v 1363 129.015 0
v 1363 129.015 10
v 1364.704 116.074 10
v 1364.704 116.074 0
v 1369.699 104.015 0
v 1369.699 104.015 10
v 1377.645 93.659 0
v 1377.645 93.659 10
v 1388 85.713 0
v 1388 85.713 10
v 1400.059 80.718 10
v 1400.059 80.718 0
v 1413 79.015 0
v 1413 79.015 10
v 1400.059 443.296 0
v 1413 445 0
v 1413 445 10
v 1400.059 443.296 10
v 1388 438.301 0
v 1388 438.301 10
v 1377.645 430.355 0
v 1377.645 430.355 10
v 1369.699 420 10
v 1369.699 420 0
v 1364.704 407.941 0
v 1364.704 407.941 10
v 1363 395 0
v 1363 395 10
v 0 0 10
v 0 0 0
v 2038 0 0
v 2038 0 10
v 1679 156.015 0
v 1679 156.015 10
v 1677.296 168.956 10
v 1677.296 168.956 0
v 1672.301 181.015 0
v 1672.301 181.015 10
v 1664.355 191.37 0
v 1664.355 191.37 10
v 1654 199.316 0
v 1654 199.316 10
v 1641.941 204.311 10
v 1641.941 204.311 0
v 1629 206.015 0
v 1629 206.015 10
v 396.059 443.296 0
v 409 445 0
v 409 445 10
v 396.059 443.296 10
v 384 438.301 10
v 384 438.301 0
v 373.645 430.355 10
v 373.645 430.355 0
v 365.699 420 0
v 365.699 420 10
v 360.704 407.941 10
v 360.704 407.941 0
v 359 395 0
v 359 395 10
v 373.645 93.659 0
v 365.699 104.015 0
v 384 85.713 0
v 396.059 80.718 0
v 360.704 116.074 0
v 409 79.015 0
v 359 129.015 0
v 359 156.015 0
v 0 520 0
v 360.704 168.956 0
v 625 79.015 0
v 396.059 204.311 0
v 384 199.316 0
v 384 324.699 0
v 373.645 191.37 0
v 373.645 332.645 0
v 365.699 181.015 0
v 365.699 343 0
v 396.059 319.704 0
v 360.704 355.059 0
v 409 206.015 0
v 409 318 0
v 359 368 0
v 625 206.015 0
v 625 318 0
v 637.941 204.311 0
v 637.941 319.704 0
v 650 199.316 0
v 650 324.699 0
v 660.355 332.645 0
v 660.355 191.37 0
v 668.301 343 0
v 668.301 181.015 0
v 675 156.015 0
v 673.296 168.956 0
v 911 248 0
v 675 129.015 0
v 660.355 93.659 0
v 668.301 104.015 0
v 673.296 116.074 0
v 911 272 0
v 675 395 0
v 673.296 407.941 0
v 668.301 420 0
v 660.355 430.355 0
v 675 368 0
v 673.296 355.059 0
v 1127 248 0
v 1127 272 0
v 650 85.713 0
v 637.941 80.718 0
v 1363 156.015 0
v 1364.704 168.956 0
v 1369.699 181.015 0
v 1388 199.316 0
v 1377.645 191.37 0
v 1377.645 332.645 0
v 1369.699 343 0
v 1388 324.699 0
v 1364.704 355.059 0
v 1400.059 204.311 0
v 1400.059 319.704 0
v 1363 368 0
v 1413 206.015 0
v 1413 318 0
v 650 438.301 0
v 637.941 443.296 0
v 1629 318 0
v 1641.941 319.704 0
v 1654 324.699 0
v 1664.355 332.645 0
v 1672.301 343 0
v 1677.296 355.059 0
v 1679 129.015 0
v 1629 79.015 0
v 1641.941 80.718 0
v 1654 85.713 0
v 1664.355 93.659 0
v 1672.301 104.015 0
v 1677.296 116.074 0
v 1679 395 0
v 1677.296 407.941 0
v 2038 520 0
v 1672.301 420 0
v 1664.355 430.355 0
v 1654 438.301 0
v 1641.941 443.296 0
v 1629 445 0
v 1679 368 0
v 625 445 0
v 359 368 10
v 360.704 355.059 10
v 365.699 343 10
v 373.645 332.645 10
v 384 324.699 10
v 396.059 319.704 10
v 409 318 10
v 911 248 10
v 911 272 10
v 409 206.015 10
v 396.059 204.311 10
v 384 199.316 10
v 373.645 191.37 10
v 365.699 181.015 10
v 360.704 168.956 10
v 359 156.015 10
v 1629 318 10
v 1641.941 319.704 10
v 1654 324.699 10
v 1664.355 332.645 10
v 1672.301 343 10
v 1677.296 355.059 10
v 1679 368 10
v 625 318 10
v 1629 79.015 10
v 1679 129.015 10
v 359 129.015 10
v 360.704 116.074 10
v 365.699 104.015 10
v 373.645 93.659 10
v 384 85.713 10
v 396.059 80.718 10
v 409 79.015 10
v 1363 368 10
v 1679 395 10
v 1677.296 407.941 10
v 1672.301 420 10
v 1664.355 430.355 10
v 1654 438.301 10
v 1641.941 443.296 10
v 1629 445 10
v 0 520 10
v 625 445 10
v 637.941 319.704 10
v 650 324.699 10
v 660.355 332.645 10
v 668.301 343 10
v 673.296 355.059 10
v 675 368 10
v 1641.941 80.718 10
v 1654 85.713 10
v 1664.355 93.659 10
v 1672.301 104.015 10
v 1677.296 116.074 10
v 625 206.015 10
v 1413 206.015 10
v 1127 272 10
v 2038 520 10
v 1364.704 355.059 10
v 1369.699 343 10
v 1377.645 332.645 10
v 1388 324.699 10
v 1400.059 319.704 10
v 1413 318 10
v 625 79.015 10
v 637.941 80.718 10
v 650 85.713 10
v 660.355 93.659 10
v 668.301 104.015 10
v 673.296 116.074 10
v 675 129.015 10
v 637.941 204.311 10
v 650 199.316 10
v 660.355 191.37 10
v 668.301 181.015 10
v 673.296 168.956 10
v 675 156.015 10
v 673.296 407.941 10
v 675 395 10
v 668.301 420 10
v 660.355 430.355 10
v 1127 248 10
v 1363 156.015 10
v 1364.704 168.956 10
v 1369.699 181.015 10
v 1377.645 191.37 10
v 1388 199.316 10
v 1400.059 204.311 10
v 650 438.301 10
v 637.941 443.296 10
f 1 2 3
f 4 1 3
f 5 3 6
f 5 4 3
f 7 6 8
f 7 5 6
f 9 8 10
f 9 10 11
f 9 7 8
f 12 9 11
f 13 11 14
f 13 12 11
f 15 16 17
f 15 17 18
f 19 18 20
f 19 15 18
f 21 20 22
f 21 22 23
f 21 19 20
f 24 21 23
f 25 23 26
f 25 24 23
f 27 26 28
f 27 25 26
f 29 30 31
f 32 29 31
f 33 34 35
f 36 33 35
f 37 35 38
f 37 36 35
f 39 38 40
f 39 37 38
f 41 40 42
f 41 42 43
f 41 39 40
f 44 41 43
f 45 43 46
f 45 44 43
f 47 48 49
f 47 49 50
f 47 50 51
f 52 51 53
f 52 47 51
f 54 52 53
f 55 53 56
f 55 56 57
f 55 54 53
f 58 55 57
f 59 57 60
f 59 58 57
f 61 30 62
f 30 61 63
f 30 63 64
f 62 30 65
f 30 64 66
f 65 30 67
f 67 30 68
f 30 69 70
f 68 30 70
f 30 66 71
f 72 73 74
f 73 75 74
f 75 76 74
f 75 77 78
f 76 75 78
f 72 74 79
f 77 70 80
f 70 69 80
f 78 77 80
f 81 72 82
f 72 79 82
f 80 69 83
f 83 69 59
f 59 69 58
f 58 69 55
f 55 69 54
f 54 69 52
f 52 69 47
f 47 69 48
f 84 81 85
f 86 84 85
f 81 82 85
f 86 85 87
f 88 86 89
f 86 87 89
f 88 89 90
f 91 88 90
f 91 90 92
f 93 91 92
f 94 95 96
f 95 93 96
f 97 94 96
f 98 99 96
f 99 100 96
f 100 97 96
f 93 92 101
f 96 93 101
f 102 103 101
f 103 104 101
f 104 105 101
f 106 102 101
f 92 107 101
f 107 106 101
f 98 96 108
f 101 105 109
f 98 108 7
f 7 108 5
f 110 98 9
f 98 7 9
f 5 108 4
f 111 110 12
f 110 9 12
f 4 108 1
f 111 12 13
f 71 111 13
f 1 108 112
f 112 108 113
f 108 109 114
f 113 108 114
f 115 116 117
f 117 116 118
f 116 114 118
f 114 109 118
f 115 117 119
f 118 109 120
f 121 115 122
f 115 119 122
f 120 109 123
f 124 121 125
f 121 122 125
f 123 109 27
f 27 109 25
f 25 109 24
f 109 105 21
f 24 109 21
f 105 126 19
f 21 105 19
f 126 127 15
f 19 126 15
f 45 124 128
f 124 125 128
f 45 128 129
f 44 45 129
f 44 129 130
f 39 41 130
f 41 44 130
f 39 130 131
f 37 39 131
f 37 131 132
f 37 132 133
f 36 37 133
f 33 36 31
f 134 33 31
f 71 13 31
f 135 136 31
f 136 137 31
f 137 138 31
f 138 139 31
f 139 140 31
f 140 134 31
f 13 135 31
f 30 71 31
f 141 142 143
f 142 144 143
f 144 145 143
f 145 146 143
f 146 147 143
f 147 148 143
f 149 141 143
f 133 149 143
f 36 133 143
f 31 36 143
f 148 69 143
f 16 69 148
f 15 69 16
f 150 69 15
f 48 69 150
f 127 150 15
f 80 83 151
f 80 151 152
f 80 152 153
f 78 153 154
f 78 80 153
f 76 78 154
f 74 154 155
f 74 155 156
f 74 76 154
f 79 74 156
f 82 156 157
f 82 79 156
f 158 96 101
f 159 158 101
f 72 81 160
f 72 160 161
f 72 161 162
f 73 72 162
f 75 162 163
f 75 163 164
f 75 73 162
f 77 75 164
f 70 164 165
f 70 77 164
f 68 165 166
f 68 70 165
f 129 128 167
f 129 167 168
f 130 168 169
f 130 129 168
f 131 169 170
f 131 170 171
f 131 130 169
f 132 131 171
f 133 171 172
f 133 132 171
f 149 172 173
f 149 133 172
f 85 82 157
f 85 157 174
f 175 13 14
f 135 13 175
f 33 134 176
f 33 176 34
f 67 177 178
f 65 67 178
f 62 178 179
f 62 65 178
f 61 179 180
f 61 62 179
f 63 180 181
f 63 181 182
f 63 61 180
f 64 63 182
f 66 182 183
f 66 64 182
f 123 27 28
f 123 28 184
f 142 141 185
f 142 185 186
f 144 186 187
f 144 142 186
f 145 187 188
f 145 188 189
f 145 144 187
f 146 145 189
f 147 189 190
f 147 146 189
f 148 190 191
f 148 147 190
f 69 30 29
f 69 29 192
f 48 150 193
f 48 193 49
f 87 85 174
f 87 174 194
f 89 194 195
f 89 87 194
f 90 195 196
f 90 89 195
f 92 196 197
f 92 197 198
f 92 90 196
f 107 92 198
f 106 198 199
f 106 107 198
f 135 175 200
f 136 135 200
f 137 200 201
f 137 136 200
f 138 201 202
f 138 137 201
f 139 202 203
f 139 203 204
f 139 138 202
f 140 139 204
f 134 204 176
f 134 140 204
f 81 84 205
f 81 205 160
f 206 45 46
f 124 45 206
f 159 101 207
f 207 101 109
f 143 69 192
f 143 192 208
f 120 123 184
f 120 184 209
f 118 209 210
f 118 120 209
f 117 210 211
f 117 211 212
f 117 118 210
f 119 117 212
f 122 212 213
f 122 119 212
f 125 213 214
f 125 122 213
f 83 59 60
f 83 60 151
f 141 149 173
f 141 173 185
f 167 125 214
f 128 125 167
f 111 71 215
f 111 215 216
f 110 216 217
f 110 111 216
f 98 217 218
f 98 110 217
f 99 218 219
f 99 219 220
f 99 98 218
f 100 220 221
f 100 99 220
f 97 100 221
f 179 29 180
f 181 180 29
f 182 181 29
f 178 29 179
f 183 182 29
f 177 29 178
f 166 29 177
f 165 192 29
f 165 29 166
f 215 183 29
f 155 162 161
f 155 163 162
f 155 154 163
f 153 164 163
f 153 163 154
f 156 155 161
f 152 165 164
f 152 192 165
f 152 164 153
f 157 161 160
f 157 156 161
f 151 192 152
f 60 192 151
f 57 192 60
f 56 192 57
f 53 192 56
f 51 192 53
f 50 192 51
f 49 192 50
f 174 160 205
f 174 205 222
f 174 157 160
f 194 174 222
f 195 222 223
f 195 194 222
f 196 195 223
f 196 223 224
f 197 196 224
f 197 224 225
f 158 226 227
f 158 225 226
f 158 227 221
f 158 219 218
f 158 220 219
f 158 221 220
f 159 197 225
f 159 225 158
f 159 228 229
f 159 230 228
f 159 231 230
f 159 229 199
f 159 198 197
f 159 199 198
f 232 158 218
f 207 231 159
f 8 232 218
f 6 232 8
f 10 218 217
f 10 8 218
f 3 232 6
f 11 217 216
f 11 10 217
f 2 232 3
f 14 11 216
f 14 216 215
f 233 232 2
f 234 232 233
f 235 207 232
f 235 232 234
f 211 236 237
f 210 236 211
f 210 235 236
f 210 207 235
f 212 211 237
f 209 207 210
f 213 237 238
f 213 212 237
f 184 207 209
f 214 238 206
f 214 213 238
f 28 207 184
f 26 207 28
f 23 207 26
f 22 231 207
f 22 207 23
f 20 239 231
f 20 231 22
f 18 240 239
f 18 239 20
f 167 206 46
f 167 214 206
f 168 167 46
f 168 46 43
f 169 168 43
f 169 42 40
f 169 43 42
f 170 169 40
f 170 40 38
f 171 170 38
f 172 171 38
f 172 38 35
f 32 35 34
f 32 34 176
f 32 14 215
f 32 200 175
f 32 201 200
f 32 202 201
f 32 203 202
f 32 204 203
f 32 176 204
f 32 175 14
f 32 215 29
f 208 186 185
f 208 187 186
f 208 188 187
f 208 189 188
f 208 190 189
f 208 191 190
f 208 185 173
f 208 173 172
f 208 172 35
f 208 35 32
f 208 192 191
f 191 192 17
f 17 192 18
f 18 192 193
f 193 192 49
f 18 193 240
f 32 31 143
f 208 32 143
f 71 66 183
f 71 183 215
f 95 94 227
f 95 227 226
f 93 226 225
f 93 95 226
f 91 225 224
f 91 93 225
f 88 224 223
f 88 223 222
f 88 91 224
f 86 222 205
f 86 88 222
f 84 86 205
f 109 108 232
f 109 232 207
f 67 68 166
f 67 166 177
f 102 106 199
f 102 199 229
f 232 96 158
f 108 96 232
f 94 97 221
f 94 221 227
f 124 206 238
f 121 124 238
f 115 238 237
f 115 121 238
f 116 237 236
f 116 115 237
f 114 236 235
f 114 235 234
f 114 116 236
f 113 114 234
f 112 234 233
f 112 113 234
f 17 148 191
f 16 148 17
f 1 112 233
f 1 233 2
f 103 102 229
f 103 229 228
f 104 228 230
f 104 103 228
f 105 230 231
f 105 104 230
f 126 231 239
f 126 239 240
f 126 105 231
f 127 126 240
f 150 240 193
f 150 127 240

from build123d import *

# Parameters (mm, degrees)
SKETCH_W   = 2038
SKETCH_H   = 520
SKETCH_W_2 = 216
SKETCH_H_2 = 24
PAD_DEPTH  = 10


with BuildPart() as part:
    # Sketch → Pad (new body)
    with BuildSketch(Plane.XY):
        with Locations((1019, 260)):
            Rectangle(SKETCH_W, SKETCH_H)
        with BuildLine():
            Line((359, 395), (359, 368))
            ThreePointArc((359, 368), (373.644661, 332.644661), (409, 318))
            Line((409, 318), (625, 318))
            ThreePointArc((625, 318), (660.355339, 332.644661), (675, 368))
            Line((675, 368), (675, 395))
            ThreePointArc((675, 395), (660.355339, 430.355339), (625, 445))
            Line((625, 445), (409, 445))
            ThreePointArc((409, 445), (373.644661, 430.355339), (359, 395))
        make_face(mode=Mode.SUBTRACT)
        with BuildLine():
            Line((1363, 395), (1363, 368))
            ThreePointArc((1363, 368), (1377.644661, 332.644661), (1413, 318))
            Line((1413, 318), (1629, 318))
            ThreePointArc((1629, 318), (1664.355339, 332.644661), (1679, 368))
            Line((1679, 368), (1679, 395))
            ThreePointArc((1679, 395), (1664.355339, 430.355339), (1629, 445))
            Line((1629, 445), (1413, 445))
            ThreePointArc((1413, 445), (1377.644661, 430.355339), (1363, 395))
        make_face(mode=Mode.SUBTRACT)
        with BuildLine():
            Line((359, 156.0146), (359, 129.0146))
            ThreePointArc((359, 129.0146), (373.644661, 93.659261), (409, 79.0146))
            Line((409, 79.0146), (625, 79.0146))
            ThreePointArc((625, 79.0146), (660.355339, 93.659261), (675, 129.0146))
            Line((675, 129.0146), (675, 156.0146))
            ThreePointArc((675, 156.0146), (660.355339, 191.369939), (625, 206.0146))
            Line((625, 206.0146), (409, 206.0146))
            ThreePointArc((409, 206.0146), (373.644661, 191.369939), (359, 156.0146))
        make_face(mode=Mode.SUBTRACT)
        with BuildLine():
            Line((1363, 156.0146), (1363, 129.0146))
            ThreePointArc((1363, 129.0146), (1377.644661, 93.659261), (1413, 79.0146))
            Line((1413, 79.0146), (1629, 79.0146))
            ThreePointArc((1629, 79.0146), (1664.355339, 93.659261), (1679, 129.0146))
            Line((1679, 129.0146), (1679, 156.0146))
            ThreePointArc((1679, 156.0146), (1664.355339, 191.369939), (1629, 206.0146))
            Line((1629, 206.0146), (1413, 206.0146))
            ThreePointArc((1413, 206.0146), (1377.644661, 191.369939), (1363, 156.0146))
        make_face(mode=Mode.SUBTRACT)
        with Locations((1019, 260)):
            Rectangle(SKETCH_W_2, SKETCH_H_2, mode=Mode.SUBTRACT)
    extrude(amount=PAD_DEPTH)


solid = part.part
